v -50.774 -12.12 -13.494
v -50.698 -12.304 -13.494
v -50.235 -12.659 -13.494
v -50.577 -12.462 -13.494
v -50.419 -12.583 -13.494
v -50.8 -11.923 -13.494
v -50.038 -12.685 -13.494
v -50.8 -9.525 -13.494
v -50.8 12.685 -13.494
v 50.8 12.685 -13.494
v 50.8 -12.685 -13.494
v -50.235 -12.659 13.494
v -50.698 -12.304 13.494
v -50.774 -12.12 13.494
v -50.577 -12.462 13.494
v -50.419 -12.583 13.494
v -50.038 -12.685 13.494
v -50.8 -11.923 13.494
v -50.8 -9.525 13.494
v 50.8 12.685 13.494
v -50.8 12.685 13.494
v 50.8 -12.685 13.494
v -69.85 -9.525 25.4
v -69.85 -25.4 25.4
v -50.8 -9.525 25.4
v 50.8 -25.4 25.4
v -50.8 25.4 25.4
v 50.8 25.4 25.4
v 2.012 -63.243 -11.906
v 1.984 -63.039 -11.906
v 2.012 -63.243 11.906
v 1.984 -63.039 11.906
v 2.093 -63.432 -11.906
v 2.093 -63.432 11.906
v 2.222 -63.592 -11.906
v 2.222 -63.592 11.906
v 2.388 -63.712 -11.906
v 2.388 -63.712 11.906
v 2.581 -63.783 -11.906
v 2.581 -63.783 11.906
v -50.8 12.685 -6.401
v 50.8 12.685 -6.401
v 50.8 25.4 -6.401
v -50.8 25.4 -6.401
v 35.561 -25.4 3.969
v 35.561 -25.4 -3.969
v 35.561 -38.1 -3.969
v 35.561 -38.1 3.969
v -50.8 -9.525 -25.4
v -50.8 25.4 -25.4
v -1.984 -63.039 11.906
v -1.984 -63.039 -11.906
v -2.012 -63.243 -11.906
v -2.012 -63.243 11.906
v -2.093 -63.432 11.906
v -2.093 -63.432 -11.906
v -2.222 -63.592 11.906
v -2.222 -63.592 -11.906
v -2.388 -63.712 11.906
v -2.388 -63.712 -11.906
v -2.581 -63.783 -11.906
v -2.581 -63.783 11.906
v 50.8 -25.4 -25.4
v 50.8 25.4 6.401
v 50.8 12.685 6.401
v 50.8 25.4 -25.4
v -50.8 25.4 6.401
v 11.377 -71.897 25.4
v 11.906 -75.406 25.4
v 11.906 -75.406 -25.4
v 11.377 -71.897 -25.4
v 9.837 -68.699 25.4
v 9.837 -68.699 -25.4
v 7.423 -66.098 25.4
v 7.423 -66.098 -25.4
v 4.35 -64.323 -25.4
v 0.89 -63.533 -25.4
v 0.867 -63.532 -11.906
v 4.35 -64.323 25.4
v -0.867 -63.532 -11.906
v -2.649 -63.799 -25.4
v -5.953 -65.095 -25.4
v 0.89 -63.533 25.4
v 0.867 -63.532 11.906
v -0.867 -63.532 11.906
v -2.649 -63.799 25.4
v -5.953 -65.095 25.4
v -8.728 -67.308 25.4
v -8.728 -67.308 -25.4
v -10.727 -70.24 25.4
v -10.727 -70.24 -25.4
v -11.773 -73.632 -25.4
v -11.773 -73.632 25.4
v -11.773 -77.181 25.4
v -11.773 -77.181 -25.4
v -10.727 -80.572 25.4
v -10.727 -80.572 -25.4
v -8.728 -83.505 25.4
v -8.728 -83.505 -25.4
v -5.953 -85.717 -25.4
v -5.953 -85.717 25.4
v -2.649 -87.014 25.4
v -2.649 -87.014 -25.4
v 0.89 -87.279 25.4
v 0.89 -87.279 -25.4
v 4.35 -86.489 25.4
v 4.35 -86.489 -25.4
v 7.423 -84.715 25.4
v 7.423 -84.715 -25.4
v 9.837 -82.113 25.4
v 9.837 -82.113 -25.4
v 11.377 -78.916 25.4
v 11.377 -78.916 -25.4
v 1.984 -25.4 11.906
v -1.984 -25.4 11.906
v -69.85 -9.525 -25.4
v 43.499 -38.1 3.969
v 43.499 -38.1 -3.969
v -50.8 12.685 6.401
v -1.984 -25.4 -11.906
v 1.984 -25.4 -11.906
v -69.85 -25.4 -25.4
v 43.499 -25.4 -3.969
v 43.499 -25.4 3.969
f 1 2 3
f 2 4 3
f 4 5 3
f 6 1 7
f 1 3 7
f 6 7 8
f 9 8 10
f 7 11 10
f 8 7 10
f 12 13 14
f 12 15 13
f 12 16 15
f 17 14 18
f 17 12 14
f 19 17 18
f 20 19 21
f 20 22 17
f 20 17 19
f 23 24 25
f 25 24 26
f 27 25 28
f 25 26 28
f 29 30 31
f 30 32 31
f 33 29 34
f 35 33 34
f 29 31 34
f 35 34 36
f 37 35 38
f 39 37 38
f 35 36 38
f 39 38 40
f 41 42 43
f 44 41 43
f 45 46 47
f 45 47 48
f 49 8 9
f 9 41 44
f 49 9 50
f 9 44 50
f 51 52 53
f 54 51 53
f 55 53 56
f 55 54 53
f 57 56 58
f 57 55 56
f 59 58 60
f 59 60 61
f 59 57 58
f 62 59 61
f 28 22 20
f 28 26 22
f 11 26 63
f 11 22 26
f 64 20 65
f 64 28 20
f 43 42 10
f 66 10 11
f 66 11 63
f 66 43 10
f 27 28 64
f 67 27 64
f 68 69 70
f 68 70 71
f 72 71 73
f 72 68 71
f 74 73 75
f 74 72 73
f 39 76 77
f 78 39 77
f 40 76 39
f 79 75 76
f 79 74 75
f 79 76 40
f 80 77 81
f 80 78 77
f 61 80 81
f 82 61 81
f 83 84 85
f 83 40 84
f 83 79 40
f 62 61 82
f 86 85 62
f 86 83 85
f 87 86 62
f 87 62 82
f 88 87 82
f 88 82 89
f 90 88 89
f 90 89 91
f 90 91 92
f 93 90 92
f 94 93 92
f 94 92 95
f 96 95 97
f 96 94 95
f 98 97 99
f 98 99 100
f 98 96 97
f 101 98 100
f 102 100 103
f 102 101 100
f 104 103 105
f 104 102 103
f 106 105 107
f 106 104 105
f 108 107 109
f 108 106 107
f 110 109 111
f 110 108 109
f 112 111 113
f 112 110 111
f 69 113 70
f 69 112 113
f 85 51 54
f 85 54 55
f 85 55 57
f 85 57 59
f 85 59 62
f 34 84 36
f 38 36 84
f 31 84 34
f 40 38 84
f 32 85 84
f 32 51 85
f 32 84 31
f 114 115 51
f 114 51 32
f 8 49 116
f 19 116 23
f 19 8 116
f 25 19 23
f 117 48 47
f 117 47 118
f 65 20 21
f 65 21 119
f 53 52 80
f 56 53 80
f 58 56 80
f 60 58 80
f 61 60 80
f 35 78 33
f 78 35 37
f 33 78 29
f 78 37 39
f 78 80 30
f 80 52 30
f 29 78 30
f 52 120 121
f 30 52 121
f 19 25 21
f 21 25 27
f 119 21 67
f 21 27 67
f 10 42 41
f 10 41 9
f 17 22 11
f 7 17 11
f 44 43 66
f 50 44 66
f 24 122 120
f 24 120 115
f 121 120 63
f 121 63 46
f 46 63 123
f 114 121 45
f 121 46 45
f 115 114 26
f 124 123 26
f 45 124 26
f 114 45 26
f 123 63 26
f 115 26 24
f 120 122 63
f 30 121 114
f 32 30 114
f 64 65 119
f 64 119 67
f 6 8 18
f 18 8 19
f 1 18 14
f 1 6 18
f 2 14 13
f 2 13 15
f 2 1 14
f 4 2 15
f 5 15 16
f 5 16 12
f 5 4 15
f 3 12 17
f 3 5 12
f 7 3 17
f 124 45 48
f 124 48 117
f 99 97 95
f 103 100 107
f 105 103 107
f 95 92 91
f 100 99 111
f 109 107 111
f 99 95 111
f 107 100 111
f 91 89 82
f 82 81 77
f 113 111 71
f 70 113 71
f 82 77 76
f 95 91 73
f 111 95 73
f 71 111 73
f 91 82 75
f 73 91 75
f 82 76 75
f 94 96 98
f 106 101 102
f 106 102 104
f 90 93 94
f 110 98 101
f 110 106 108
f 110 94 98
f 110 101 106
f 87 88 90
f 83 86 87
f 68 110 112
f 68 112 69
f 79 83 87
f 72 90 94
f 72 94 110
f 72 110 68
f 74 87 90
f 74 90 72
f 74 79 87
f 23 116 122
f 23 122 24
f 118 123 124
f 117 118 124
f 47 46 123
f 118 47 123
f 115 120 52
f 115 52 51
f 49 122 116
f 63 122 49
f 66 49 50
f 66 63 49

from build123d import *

# Parameters (mm, degrees)
SKETCH1_W           = 50.8
SKETCH1_H           = 50.8
BOSS_EXTRUDE1_DEPTH = 50.8
SKETCH2_W           = 12.8016
SKETCH2_H           = 12.71524
SKETCH2_W_2         = 26.9875
SKETCH2_H_2         = 25.36952
CUT_EXTRUDE1_DEPTH  = 108.763073453
SKETCH3_W           = 3.96875
SKETCH3_H           = 23.8125
BOSS_EXTRUDE2_DEPTH = 50.00625
SKETCH4_R           = 11.90625
BOSS_EXTRUDE3_DEPTH = 25.4
SKETCH5_W           = 50.8
SKETCH5_H           = 15.875
BOSS_EXTRUDE4_DEPTH = 19.05
SKETCH6_W           = 7.9375
SKETCH6_H           = 7.9375
BOSS_EXTRUDE5_DEPTH = 12.7
FILLET1_R           = 0.762


with BuildPart() as part:
    # Sketch1 → Boss-Extrude1 (new, symmetric)
    with BuildSketch(Plane(origin=(0, 0, 0), x_dir=(0, 0, -1), z_dir=(1, 0, 0))):
        Rectangle(SKETCH1_W, SKETCH1_H)
    extrude(amount=BOSS_EXTRUDE1_DEPTH, both=True)

    # Sketch2 → Cut-Extrude1 (cut, through all)
    with BuildSketch(Plane(origin=(50.8, 0, 0), x_dir=(0, 0, -1), z_dir=(1, 0, 0))):
        with Locations((0, 19.04238)):
            Rectangle(SKETCH2_W, SKETCH2_H)
        Rectangle(SKETCH2_W_2, SKETCH2_H_2)
    extrude(amount=-CUT_EXTRUDE1_DEPTH, mode=Mode.SUBTRACT)

    # Sketch3 → Boss-Extrude2 (add)
    with BuildSketch(Plane.XZ.offset(25.4)):
        Rectangle(SKETCH3_W, SKETCH3_H)
    extrude(amount=BOSS_EXTRUDE2_DEPTH)

    # Sketch4 → Boss-Extrude3 (add, symmetric)
    with BuildSketch(Plane.XY):
        with Locations((0, -75.40625)):
            Circle(SKETCH4_R)
    extrude(amount=BOSS_EXTRUDE3_DEPTH, both=True)

    # Sketch5 → Boss-Extrude4 (add)
    with BuildSketch(Plane.ZY.offset(50.8)):
        with Locations((0, -17.4625)):
            Rectangle(SKETCH5_W, SKETCH5_H)
    extrude(amount=BOSS_EXTRUDE4_DEPTH)

    # Sketch6 → Boss-Extrude5 (add)
    with BuildSketch(Plane.XZ.offset(25.4)):
        with Locations((39.53002, 0)):
            Rectangle(SKETCH6_W, SKETCH6_H)
    extrude(amount=BOSS_EXTRUDE5_DEPTH)

    # Fillet1
    fillet1_edges = [part.edges().sort_by_distance(p)[0] for p in [
        (-50.8, -12.68476, 0),
        (1.984375, -63.66652918, 0),
        (-1.984375, -63.66652918, 0),
    ]]
    fillet(fillet1_edges, radius=FILLET1_R)


solid = part.part
